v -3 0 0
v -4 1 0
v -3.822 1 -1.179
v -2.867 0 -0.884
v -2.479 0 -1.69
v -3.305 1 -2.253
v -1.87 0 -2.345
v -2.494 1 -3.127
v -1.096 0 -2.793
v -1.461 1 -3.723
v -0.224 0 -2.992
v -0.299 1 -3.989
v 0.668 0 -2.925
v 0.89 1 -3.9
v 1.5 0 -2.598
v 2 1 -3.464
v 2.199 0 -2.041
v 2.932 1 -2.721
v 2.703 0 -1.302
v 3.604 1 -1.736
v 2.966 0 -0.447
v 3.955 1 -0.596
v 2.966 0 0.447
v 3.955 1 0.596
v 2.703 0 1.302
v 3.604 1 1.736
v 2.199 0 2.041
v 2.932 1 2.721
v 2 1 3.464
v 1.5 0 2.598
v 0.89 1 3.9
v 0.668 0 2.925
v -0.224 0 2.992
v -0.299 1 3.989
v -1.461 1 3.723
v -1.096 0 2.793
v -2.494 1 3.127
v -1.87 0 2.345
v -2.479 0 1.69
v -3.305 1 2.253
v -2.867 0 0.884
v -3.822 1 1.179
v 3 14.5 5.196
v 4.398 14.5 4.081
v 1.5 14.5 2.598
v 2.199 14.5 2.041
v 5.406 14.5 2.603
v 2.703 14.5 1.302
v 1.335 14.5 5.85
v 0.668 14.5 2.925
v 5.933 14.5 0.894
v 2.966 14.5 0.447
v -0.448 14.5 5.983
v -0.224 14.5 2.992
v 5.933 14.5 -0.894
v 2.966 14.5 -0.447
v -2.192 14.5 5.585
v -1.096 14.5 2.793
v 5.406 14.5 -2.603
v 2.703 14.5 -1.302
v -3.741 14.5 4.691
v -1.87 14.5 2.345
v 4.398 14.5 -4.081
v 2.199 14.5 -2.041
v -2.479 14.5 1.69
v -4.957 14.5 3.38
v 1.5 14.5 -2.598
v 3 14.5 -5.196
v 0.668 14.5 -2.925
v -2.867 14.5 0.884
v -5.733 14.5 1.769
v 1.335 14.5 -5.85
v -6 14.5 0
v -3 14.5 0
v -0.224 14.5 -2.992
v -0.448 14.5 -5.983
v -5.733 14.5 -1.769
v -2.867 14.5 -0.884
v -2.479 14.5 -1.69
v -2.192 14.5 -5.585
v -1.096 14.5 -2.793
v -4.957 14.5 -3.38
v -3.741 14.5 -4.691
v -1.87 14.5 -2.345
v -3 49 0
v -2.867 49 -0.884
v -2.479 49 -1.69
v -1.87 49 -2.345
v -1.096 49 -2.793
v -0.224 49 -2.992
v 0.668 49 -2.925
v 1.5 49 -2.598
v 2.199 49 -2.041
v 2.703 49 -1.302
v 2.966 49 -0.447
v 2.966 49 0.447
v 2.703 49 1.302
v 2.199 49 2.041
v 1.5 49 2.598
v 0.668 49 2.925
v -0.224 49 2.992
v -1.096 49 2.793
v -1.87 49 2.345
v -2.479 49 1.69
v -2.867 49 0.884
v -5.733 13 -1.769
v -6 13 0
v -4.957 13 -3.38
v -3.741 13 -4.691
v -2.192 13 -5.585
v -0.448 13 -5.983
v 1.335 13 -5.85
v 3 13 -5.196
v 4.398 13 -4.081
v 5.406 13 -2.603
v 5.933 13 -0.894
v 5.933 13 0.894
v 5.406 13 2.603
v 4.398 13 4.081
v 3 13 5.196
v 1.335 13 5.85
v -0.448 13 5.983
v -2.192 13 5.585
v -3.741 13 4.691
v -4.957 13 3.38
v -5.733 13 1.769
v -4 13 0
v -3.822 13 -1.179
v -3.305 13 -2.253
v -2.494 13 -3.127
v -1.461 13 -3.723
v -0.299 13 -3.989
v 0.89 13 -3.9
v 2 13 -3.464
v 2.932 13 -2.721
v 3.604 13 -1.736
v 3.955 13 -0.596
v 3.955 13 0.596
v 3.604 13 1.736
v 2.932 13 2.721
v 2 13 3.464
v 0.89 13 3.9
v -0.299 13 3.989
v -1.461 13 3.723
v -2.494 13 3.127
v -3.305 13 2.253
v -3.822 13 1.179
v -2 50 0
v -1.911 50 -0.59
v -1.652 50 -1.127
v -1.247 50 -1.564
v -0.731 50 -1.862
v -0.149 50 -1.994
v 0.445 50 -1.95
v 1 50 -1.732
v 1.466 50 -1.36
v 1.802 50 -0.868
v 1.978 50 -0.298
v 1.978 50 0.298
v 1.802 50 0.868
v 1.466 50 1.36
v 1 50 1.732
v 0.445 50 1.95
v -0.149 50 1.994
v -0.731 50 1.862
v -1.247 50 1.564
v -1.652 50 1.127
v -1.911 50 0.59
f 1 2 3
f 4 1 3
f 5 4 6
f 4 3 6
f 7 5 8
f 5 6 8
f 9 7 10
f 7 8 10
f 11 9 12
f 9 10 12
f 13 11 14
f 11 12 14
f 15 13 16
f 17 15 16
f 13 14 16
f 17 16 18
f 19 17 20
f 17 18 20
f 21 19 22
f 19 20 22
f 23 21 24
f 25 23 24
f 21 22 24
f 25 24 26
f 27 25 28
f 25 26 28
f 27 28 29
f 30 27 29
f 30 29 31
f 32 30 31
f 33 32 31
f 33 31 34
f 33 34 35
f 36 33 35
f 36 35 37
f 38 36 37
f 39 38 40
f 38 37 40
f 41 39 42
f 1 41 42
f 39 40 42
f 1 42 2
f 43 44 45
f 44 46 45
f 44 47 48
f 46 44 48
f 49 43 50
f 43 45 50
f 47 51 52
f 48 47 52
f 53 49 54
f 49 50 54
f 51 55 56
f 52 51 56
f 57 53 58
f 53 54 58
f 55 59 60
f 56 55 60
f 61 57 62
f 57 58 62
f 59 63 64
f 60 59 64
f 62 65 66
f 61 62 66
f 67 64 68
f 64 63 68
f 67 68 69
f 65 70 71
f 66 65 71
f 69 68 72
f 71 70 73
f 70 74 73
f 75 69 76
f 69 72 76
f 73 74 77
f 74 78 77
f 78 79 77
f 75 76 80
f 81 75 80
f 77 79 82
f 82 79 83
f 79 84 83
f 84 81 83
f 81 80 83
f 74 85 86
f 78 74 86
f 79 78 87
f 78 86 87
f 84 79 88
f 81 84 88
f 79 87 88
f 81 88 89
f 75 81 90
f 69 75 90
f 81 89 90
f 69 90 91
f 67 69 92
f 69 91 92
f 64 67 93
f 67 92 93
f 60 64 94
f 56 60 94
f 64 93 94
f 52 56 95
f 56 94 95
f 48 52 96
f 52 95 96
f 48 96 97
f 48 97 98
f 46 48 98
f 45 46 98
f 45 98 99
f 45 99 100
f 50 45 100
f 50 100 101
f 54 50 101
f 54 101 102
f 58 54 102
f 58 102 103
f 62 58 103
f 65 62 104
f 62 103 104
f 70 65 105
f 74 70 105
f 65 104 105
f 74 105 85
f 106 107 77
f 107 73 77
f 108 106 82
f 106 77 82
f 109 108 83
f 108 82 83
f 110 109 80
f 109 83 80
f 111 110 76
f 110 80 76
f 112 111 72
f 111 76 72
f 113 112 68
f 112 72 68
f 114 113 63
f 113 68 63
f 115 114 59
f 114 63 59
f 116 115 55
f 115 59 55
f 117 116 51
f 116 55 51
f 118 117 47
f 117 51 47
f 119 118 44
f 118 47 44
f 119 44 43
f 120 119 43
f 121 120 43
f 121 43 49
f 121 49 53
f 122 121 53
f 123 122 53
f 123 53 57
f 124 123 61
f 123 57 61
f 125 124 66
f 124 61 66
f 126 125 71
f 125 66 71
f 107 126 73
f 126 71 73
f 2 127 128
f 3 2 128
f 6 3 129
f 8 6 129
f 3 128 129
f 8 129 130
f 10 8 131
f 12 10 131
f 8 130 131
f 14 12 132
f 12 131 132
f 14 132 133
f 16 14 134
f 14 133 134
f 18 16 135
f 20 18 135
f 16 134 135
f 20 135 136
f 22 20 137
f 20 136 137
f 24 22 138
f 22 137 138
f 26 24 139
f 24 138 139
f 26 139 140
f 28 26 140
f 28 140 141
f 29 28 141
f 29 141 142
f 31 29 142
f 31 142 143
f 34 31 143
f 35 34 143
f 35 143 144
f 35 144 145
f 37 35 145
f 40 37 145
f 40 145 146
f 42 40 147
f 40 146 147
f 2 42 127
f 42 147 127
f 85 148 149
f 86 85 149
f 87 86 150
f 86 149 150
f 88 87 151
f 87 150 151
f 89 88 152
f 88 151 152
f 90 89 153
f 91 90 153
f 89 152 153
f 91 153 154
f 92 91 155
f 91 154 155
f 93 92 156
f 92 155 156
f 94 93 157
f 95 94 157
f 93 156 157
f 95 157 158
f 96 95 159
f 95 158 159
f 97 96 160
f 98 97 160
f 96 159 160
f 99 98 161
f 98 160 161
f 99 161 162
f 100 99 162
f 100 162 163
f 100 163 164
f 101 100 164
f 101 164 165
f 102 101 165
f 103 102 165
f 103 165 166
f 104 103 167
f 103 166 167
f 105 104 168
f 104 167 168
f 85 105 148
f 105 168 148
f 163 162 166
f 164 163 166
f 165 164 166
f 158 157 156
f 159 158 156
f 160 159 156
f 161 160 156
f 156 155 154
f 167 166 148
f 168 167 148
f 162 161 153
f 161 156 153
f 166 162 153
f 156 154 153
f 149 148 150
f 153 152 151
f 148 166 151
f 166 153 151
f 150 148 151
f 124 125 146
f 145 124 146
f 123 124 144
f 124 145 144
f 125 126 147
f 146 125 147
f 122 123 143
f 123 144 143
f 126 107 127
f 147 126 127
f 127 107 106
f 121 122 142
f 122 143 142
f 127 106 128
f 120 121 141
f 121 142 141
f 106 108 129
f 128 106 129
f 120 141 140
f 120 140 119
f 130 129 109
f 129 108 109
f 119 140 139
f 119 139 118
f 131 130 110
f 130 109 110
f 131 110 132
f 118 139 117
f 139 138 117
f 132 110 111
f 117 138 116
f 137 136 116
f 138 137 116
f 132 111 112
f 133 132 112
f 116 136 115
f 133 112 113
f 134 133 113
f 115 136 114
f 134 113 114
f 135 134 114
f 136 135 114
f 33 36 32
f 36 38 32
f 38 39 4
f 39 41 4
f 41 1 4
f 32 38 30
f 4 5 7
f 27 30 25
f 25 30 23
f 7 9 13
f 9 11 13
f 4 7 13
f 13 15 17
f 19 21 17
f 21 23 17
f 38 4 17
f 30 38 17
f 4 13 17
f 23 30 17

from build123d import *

# Parameters (mm, degrees)
CHAMFER_1_SIZE = 1
CHAMFER_2_SIZE = 1


with BuildPart() as part:
    # 草图1 → 旋转1 (revolve)
    with BuildSketch(Plane.XY):
        Polygon((0, 0), (-4, 0), (-4, 13), (-6, 13), (-6, 14.5), (-3, 14.5), (-3, 50), (0, 50), align=None)
    revolve(axis=Axis((0, 50, 0), (0, -1, 0)))

    # 倒角1
    chamfer_1_edges = [part.edges().sort_by_distance(p)[0] for p in [
        (4, 0, 0),
    ]]
    chamfer(chamfer_1_edges, length=CHAMFER_1_SIZE)

    # 倒角2
    chamfer_2_edges = [part.edges().sort_by_distance(p)[0] for p in [
        (3, 50, 0),
    ]]
    chamfer(chamfer_2_edges, length=CHAMFER_2_SIZE)


solid = part.part
